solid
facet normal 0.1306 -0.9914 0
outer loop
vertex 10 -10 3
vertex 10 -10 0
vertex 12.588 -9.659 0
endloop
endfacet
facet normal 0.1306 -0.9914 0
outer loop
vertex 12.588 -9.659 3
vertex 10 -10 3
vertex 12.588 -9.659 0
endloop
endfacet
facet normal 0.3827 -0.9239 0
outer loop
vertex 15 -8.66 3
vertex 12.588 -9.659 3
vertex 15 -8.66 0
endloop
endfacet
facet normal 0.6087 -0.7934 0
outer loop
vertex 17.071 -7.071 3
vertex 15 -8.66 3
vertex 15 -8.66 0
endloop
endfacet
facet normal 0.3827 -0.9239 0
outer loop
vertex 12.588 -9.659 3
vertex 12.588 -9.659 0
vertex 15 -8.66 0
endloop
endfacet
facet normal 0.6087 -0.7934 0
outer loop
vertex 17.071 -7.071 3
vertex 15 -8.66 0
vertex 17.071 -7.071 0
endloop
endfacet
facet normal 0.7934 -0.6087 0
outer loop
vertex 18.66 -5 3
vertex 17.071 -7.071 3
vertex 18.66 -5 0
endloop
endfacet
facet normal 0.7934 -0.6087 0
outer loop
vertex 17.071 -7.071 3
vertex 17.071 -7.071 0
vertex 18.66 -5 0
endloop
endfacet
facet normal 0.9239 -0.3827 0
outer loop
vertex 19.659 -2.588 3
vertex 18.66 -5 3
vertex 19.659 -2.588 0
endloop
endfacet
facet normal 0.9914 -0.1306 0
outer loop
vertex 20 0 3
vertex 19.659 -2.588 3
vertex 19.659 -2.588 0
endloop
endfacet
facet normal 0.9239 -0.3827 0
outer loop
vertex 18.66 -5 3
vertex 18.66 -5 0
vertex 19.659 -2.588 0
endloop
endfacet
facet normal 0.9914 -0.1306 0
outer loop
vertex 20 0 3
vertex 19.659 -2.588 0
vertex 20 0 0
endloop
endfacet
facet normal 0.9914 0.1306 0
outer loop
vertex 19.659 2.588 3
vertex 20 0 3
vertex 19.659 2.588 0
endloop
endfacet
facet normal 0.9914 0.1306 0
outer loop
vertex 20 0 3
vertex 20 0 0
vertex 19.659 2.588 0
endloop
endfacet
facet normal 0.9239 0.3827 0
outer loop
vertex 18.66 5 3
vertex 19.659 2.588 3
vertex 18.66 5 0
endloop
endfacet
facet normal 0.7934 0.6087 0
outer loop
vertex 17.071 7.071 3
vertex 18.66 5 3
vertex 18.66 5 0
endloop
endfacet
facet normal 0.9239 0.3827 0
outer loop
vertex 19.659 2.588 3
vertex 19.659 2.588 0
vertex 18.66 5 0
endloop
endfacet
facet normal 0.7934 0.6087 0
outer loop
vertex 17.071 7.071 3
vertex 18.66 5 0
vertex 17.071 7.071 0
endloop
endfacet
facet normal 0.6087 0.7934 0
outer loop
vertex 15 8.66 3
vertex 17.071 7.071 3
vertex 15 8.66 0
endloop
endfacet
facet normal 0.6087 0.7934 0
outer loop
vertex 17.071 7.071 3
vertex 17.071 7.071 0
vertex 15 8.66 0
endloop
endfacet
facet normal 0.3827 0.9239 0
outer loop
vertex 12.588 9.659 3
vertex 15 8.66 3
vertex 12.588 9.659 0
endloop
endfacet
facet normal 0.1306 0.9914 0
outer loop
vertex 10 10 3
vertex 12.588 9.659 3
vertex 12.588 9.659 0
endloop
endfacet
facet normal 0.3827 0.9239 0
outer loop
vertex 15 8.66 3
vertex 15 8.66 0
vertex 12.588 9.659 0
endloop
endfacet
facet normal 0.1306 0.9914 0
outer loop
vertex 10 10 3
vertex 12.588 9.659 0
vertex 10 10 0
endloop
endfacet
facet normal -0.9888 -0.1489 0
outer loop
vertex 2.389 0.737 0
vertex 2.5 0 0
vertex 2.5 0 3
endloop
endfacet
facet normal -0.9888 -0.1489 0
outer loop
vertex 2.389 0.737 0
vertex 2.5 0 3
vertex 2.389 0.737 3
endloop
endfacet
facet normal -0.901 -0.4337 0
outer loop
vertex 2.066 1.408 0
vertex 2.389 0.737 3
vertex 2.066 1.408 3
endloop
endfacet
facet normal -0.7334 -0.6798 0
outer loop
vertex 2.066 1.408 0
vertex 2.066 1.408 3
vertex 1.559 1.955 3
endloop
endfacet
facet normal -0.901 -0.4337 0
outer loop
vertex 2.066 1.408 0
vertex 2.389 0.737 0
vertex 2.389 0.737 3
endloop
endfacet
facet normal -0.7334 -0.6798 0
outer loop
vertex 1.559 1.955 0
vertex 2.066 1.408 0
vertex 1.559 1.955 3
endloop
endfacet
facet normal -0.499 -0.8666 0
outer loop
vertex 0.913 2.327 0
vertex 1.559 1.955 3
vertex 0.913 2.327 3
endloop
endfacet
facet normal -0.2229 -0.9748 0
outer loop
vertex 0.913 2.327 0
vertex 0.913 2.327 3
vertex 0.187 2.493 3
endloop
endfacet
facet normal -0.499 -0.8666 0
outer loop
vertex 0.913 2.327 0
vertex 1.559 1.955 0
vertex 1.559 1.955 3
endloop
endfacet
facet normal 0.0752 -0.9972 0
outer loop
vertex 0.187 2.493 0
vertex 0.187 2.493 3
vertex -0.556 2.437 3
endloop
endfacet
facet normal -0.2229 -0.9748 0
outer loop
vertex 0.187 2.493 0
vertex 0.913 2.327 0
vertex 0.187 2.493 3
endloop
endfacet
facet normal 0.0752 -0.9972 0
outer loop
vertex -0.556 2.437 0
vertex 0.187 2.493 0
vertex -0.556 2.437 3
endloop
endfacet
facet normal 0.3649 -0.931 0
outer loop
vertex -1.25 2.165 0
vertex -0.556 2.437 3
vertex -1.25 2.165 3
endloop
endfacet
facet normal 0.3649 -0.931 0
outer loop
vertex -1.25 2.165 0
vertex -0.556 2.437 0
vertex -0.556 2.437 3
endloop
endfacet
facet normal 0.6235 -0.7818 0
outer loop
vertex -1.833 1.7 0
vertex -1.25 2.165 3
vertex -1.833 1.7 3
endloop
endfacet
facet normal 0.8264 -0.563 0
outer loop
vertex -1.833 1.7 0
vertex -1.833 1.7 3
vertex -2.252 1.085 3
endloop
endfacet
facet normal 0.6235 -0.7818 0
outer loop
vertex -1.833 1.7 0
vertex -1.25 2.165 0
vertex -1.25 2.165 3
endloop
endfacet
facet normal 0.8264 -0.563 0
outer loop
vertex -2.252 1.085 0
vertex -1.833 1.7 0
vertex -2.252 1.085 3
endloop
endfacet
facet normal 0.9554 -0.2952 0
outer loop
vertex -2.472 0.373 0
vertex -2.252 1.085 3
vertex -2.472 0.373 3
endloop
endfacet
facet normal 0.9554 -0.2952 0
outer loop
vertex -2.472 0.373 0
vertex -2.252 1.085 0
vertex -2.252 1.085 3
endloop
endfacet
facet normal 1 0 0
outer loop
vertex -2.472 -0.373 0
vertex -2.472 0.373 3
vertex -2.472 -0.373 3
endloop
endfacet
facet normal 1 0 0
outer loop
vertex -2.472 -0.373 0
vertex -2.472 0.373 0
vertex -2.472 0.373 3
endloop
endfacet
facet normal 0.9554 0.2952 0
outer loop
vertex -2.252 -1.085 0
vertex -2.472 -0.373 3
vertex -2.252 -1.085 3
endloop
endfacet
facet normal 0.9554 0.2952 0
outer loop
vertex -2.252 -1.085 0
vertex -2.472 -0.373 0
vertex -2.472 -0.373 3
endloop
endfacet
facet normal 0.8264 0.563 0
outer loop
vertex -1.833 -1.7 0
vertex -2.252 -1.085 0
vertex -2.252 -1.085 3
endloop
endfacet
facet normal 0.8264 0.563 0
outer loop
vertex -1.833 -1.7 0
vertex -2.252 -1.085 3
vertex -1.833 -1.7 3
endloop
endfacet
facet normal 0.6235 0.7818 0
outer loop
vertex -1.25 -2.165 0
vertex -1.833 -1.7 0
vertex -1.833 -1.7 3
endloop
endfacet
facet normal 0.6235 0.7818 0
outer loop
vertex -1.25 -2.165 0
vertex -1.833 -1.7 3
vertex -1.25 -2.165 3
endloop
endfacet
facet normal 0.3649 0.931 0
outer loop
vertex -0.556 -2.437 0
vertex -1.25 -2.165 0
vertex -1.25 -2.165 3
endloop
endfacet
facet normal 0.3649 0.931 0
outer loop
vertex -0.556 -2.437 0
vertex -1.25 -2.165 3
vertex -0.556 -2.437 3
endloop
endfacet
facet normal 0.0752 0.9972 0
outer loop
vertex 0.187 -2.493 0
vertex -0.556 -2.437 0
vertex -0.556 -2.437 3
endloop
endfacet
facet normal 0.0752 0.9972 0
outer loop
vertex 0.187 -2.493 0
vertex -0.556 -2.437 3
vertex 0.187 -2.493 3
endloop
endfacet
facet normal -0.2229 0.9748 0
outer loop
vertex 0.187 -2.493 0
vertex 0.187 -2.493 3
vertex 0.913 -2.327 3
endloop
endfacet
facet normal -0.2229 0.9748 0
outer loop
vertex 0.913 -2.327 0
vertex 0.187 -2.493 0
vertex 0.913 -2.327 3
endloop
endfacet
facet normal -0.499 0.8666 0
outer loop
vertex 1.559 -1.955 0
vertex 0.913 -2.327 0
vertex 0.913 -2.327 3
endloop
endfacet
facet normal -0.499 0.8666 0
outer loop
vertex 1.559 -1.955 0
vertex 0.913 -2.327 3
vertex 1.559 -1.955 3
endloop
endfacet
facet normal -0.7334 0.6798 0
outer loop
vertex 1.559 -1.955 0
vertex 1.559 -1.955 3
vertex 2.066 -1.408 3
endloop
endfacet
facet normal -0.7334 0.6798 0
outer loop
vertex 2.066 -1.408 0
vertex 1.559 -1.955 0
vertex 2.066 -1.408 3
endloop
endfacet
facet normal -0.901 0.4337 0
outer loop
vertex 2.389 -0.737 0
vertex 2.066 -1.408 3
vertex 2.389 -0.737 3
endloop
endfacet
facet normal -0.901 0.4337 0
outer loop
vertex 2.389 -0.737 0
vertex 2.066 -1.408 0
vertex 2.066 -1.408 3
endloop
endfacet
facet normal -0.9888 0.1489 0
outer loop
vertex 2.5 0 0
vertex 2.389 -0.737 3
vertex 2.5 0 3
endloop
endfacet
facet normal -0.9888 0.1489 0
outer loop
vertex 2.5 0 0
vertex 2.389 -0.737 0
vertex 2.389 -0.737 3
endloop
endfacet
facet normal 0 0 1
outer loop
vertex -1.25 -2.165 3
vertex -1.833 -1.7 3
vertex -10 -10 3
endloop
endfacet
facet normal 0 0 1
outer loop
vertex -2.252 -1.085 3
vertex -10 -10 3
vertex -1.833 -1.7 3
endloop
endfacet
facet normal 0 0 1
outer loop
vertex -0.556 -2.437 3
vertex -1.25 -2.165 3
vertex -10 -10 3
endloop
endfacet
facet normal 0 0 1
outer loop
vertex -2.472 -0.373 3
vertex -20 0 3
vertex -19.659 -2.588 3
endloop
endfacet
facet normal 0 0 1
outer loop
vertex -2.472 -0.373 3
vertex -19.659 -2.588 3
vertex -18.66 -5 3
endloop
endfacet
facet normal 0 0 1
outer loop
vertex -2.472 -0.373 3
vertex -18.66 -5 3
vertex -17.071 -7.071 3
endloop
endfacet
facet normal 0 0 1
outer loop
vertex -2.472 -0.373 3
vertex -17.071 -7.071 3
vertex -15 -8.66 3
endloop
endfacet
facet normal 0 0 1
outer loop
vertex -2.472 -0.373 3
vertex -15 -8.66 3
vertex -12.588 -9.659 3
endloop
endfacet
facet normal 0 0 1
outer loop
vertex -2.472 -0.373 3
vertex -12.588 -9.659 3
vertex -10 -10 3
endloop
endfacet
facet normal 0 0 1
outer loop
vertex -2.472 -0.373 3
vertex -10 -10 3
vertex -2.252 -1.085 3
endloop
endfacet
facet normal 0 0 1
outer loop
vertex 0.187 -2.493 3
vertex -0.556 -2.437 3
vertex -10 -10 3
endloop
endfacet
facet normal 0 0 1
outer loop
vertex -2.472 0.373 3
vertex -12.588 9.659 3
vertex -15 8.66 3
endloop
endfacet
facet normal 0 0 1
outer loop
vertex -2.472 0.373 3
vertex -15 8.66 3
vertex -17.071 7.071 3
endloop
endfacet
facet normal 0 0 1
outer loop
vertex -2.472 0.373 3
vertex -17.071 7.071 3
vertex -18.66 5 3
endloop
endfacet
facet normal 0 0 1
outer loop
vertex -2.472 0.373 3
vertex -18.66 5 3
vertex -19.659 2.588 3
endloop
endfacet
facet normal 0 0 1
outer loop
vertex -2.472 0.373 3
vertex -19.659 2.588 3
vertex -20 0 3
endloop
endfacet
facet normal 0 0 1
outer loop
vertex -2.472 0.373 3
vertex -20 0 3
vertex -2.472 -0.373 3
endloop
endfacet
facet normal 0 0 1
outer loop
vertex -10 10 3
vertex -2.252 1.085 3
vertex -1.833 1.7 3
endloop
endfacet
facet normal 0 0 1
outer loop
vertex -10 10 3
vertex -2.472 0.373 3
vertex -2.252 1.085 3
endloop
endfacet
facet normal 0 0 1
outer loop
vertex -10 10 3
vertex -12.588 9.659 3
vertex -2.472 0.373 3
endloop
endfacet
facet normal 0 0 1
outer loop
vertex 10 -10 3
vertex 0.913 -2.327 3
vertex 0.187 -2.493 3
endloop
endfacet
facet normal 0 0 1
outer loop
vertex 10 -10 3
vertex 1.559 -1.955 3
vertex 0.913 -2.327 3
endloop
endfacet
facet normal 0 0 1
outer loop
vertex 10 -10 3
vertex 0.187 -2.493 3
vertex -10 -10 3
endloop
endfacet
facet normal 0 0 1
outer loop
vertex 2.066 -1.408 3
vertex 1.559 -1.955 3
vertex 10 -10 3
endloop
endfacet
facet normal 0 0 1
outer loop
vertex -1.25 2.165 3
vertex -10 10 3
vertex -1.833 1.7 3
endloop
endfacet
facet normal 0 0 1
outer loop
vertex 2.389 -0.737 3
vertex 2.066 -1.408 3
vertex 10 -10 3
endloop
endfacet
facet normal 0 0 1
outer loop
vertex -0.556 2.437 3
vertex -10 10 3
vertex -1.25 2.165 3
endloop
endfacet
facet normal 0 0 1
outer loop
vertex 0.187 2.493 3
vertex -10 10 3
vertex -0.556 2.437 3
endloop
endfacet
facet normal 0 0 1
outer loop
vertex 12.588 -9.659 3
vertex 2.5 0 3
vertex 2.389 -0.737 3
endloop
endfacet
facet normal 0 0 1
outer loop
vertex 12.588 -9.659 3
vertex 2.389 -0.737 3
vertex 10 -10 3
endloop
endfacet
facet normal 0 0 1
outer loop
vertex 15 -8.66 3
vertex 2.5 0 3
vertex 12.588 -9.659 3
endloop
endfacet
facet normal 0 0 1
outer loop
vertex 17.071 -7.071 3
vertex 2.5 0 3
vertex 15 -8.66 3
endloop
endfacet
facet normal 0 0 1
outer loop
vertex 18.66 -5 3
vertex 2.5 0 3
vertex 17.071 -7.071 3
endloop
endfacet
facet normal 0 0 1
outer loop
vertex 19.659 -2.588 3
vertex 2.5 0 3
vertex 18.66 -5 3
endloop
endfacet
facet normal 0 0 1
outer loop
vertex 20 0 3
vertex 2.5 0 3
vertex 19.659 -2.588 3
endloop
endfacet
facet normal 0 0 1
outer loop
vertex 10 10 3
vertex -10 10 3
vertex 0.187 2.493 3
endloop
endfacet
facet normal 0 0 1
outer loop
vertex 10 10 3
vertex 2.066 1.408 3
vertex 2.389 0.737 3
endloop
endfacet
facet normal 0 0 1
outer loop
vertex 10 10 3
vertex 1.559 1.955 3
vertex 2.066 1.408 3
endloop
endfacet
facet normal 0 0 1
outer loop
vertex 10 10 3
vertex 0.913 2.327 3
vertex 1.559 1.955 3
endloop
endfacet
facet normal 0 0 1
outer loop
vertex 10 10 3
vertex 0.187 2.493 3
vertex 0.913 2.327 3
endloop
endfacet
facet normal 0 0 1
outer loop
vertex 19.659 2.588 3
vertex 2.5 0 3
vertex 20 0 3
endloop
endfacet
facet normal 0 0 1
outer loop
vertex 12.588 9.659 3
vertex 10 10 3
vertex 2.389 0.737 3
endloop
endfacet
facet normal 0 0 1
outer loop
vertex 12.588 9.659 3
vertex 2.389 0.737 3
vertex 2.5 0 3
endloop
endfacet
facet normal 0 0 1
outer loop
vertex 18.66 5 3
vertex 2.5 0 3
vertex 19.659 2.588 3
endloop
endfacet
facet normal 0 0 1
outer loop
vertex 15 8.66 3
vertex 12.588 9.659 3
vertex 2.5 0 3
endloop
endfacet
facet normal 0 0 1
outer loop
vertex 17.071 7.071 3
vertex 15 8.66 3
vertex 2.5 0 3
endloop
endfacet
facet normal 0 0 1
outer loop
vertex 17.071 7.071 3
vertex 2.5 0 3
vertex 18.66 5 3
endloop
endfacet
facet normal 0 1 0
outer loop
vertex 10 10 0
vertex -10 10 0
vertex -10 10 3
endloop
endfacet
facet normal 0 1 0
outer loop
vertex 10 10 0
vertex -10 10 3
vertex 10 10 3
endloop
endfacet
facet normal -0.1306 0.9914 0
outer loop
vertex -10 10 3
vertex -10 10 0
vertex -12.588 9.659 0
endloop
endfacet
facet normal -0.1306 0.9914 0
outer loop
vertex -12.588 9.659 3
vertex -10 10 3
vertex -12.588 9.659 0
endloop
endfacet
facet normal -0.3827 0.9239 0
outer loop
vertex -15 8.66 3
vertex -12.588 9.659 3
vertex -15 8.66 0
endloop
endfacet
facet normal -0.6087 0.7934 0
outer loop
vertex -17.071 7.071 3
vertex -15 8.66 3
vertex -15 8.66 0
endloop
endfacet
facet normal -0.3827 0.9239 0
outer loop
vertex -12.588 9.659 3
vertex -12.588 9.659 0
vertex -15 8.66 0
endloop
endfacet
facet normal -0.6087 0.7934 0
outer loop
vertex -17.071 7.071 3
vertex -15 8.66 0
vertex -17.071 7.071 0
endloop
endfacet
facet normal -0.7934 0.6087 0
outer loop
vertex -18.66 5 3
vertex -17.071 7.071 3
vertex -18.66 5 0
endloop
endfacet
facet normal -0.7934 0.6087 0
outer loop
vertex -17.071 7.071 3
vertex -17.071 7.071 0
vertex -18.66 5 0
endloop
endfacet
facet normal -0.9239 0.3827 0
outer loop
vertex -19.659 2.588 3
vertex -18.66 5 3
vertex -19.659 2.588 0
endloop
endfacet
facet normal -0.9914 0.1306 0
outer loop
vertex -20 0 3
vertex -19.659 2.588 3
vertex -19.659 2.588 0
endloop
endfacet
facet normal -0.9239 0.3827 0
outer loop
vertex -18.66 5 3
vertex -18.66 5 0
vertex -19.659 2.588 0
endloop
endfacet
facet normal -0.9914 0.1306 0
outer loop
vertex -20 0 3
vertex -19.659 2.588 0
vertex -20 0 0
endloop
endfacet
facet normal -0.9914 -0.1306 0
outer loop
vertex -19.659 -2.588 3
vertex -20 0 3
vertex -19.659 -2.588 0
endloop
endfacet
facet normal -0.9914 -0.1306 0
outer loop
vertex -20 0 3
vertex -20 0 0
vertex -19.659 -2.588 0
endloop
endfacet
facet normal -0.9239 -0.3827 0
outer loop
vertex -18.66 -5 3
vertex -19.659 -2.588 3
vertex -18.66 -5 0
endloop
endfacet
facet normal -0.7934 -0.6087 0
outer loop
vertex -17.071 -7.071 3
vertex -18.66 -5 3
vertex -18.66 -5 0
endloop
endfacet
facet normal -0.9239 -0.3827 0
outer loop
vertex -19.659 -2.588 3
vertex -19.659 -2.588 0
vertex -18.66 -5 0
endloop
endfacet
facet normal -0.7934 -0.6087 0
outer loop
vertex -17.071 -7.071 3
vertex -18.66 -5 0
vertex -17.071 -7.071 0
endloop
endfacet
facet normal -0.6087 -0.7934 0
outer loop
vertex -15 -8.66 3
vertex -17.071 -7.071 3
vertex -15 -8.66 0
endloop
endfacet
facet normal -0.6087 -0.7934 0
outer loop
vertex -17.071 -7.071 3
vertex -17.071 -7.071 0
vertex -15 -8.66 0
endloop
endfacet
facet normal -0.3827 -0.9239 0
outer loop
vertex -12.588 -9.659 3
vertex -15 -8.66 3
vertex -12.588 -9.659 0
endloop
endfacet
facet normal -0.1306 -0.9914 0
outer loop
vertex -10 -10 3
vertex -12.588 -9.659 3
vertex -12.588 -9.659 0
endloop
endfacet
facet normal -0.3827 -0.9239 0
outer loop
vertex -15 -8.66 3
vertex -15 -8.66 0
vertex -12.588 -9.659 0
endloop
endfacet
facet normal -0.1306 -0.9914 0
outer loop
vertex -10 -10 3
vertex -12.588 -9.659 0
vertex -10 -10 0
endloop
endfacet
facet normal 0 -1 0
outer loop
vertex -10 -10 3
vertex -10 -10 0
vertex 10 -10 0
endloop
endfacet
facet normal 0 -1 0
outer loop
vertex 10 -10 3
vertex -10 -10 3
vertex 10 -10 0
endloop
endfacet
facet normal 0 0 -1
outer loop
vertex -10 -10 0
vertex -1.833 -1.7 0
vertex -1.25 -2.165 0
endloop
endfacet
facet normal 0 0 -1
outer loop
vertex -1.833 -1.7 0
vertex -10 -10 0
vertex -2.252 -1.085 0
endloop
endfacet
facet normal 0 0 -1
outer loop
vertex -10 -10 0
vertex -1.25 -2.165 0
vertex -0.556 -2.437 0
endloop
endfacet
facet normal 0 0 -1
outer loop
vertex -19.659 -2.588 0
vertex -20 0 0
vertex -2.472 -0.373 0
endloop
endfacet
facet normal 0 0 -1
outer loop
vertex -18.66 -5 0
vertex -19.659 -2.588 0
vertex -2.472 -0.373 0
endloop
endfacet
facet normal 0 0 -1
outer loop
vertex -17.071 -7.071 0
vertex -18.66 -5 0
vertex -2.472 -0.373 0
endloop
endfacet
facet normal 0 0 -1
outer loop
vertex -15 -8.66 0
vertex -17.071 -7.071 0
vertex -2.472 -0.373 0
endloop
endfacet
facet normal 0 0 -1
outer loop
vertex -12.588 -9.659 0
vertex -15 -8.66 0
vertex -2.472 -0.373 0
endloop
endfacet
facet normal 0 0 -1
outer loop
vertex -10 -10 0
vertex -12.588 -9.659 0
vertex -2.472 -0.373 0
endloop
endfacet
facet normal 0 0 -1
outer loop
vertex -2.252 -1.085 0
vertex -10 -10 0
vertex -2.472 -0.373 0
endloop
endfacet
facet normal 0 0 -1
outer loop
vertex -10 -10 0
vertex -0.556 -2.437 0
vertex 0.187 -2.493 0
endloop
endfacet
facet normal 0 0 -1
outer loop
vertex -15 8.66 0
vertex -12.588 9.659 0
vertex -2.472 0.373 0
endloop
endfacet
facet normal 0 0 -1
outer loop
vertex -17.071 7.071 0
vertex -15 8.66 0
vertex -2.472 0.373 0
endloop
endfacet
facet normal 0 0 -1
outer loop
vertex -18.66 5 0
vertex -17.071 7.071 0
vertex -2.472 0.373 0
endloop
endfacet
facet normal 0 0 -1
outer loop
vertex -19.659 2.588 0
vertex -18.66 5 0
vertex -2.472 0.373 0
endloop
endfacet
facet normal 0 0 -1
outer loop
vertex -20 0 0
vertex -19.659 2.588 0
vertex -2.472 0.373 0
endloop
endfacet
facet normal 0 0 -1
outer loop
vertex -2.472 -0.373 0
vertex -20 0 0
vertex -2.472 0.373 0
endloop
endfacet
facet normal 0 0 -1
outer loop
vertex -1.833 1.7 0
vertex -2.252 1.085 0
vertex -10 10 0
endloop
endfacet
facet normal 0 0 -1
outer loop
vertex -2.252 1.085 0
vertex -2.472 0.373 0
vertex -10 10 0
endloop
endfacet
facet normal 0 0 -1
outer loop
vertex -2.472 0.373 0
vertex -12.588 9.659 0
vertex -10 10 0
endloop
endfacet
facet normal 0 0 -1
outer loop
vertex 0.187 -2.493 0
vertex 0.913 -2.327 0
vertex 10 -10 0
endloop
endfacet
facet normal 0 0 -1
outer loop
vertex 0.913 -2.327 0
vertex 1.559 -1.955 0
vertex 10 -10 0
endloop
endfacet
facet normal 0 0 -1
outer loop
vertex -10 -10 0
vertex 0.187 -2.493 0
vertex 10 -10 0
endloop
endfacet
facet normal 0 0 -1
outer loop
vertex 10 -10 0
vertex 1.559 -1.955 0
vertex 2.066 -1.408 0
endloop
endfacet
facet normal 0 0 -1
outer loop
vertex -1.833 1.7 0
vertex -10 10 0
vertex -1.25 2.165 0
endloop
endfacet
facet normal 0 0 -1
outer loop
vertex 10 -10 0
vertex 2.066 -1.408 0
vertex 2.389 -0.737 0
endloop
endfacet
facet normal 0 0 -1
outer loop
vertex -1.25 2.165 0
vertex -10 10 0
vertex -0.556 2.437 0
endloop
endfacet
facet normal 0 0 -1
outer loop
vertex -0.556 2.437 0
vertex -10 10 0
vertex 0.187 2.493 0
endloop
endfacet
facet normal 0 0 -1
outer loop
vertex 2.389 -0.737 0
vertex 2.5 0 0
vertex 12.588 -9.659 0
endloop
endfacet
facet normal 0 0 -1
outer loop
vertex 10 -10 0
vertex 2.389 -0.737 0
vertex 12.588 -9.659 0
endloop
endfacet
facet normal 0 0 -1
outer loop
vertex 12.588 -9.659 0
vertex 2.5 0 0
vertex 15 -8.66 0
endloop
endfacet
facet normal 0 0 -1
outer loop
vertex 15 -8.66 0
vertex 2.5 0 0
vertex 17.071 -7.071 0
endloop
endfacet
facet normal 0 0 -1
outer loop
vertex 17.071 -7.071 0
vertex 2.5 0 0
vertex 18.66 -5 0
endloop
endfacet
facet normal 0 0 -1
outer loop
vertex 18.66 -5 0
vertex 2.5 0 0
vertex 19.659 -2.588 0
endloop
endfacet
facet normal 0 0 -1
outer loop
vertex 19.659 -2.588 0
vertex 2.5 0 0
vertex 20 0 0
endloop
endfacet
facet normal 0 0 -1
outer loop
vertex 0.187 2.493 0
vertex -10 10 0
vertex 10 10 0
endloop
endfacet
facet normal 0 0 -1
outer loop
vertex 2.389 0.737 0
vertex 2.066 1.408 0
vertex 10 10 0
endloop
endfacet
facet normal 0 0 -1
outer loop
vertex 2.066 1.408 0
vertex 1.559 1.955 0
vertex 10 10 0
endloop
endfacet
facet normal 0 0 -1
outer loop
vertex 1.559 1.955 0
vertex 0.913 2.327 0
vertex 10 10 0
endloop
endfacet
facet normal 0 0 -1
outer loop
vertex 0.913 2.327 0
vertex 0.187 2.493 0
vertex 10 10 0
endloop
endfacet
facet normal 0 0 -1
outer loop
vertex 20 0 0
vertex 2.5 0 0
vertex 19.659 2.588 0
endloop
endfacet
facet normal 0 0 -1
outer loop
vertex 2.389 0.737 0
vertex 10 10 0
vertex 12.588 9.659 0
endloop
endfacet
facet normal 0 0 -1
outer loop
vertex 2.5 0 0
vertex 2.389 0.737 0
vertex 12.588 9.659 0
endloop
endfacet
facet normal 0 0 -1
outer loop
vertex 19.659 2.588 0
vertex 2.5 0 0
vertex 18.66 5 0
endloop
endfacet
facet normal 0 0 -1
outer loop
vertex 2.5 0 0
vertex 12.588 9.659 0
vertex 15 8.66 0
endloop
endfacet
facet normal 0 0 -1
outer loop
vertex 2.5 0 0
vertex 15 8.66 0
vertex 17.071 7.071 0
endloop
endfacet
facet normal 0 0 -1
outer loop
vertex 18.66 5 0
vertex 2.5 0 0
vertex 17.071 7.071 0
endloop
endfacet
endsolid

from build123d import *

# Parameters (mm, degrees)
F0_W     = 20
F0_H     = 20
F0_R     = 2.5
F1_DEPTH = 3


with BuildPart() as f1:
    # F0 (on Top) → F1 (new body)
    with BuildSketch(Plane.XY):
        with BuildLine():
            ThreePointArc((-10, 10), (-20, 0), (-10, -10))
            Line((-10, -10), (-10, 10))
        make_face()
        Rectangle(F0_W, F0_H)
        Circle(F0_R, mode=Mode.SUBTRACT)
        with BuildLine():
            Line((10, 10), (10, -10))
            ThreePointArc((10, -10), (20, 0), (10, 10))
        make_face()
    extrude(amount=F1_DEPTH)


solid = f1.part
